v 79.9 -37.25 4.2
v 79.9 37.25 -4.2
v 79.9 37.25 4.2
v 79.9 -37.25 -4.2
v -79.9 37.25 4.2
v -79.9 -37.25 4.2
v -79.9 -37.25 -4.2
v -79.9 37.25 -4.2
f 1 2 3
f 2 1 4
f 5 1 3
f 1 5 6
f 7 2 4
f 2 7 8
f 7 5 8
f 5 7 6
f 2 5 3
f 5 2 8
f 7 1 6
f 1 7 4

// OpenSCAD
l = 159.8;
w = 74.5;
h = 8.4;
//measured maximum sizes from some shop page but they seem realistic


color("yellow",0.4)cube([l,w,h], center=true); 



color("green", 0.8){
    translate([l/2-h/2, w/2-h/2,0])sphere(h/2);
    translate([-l/2+h/2, w/2-h/2,0])sphere(h/2);
    translate([l/2-h/2, -w/2+h/2,0])sphere(h/2);
    translate([-l/2+h/2, -w/2+h/2,0])sphere(h/2);
}
